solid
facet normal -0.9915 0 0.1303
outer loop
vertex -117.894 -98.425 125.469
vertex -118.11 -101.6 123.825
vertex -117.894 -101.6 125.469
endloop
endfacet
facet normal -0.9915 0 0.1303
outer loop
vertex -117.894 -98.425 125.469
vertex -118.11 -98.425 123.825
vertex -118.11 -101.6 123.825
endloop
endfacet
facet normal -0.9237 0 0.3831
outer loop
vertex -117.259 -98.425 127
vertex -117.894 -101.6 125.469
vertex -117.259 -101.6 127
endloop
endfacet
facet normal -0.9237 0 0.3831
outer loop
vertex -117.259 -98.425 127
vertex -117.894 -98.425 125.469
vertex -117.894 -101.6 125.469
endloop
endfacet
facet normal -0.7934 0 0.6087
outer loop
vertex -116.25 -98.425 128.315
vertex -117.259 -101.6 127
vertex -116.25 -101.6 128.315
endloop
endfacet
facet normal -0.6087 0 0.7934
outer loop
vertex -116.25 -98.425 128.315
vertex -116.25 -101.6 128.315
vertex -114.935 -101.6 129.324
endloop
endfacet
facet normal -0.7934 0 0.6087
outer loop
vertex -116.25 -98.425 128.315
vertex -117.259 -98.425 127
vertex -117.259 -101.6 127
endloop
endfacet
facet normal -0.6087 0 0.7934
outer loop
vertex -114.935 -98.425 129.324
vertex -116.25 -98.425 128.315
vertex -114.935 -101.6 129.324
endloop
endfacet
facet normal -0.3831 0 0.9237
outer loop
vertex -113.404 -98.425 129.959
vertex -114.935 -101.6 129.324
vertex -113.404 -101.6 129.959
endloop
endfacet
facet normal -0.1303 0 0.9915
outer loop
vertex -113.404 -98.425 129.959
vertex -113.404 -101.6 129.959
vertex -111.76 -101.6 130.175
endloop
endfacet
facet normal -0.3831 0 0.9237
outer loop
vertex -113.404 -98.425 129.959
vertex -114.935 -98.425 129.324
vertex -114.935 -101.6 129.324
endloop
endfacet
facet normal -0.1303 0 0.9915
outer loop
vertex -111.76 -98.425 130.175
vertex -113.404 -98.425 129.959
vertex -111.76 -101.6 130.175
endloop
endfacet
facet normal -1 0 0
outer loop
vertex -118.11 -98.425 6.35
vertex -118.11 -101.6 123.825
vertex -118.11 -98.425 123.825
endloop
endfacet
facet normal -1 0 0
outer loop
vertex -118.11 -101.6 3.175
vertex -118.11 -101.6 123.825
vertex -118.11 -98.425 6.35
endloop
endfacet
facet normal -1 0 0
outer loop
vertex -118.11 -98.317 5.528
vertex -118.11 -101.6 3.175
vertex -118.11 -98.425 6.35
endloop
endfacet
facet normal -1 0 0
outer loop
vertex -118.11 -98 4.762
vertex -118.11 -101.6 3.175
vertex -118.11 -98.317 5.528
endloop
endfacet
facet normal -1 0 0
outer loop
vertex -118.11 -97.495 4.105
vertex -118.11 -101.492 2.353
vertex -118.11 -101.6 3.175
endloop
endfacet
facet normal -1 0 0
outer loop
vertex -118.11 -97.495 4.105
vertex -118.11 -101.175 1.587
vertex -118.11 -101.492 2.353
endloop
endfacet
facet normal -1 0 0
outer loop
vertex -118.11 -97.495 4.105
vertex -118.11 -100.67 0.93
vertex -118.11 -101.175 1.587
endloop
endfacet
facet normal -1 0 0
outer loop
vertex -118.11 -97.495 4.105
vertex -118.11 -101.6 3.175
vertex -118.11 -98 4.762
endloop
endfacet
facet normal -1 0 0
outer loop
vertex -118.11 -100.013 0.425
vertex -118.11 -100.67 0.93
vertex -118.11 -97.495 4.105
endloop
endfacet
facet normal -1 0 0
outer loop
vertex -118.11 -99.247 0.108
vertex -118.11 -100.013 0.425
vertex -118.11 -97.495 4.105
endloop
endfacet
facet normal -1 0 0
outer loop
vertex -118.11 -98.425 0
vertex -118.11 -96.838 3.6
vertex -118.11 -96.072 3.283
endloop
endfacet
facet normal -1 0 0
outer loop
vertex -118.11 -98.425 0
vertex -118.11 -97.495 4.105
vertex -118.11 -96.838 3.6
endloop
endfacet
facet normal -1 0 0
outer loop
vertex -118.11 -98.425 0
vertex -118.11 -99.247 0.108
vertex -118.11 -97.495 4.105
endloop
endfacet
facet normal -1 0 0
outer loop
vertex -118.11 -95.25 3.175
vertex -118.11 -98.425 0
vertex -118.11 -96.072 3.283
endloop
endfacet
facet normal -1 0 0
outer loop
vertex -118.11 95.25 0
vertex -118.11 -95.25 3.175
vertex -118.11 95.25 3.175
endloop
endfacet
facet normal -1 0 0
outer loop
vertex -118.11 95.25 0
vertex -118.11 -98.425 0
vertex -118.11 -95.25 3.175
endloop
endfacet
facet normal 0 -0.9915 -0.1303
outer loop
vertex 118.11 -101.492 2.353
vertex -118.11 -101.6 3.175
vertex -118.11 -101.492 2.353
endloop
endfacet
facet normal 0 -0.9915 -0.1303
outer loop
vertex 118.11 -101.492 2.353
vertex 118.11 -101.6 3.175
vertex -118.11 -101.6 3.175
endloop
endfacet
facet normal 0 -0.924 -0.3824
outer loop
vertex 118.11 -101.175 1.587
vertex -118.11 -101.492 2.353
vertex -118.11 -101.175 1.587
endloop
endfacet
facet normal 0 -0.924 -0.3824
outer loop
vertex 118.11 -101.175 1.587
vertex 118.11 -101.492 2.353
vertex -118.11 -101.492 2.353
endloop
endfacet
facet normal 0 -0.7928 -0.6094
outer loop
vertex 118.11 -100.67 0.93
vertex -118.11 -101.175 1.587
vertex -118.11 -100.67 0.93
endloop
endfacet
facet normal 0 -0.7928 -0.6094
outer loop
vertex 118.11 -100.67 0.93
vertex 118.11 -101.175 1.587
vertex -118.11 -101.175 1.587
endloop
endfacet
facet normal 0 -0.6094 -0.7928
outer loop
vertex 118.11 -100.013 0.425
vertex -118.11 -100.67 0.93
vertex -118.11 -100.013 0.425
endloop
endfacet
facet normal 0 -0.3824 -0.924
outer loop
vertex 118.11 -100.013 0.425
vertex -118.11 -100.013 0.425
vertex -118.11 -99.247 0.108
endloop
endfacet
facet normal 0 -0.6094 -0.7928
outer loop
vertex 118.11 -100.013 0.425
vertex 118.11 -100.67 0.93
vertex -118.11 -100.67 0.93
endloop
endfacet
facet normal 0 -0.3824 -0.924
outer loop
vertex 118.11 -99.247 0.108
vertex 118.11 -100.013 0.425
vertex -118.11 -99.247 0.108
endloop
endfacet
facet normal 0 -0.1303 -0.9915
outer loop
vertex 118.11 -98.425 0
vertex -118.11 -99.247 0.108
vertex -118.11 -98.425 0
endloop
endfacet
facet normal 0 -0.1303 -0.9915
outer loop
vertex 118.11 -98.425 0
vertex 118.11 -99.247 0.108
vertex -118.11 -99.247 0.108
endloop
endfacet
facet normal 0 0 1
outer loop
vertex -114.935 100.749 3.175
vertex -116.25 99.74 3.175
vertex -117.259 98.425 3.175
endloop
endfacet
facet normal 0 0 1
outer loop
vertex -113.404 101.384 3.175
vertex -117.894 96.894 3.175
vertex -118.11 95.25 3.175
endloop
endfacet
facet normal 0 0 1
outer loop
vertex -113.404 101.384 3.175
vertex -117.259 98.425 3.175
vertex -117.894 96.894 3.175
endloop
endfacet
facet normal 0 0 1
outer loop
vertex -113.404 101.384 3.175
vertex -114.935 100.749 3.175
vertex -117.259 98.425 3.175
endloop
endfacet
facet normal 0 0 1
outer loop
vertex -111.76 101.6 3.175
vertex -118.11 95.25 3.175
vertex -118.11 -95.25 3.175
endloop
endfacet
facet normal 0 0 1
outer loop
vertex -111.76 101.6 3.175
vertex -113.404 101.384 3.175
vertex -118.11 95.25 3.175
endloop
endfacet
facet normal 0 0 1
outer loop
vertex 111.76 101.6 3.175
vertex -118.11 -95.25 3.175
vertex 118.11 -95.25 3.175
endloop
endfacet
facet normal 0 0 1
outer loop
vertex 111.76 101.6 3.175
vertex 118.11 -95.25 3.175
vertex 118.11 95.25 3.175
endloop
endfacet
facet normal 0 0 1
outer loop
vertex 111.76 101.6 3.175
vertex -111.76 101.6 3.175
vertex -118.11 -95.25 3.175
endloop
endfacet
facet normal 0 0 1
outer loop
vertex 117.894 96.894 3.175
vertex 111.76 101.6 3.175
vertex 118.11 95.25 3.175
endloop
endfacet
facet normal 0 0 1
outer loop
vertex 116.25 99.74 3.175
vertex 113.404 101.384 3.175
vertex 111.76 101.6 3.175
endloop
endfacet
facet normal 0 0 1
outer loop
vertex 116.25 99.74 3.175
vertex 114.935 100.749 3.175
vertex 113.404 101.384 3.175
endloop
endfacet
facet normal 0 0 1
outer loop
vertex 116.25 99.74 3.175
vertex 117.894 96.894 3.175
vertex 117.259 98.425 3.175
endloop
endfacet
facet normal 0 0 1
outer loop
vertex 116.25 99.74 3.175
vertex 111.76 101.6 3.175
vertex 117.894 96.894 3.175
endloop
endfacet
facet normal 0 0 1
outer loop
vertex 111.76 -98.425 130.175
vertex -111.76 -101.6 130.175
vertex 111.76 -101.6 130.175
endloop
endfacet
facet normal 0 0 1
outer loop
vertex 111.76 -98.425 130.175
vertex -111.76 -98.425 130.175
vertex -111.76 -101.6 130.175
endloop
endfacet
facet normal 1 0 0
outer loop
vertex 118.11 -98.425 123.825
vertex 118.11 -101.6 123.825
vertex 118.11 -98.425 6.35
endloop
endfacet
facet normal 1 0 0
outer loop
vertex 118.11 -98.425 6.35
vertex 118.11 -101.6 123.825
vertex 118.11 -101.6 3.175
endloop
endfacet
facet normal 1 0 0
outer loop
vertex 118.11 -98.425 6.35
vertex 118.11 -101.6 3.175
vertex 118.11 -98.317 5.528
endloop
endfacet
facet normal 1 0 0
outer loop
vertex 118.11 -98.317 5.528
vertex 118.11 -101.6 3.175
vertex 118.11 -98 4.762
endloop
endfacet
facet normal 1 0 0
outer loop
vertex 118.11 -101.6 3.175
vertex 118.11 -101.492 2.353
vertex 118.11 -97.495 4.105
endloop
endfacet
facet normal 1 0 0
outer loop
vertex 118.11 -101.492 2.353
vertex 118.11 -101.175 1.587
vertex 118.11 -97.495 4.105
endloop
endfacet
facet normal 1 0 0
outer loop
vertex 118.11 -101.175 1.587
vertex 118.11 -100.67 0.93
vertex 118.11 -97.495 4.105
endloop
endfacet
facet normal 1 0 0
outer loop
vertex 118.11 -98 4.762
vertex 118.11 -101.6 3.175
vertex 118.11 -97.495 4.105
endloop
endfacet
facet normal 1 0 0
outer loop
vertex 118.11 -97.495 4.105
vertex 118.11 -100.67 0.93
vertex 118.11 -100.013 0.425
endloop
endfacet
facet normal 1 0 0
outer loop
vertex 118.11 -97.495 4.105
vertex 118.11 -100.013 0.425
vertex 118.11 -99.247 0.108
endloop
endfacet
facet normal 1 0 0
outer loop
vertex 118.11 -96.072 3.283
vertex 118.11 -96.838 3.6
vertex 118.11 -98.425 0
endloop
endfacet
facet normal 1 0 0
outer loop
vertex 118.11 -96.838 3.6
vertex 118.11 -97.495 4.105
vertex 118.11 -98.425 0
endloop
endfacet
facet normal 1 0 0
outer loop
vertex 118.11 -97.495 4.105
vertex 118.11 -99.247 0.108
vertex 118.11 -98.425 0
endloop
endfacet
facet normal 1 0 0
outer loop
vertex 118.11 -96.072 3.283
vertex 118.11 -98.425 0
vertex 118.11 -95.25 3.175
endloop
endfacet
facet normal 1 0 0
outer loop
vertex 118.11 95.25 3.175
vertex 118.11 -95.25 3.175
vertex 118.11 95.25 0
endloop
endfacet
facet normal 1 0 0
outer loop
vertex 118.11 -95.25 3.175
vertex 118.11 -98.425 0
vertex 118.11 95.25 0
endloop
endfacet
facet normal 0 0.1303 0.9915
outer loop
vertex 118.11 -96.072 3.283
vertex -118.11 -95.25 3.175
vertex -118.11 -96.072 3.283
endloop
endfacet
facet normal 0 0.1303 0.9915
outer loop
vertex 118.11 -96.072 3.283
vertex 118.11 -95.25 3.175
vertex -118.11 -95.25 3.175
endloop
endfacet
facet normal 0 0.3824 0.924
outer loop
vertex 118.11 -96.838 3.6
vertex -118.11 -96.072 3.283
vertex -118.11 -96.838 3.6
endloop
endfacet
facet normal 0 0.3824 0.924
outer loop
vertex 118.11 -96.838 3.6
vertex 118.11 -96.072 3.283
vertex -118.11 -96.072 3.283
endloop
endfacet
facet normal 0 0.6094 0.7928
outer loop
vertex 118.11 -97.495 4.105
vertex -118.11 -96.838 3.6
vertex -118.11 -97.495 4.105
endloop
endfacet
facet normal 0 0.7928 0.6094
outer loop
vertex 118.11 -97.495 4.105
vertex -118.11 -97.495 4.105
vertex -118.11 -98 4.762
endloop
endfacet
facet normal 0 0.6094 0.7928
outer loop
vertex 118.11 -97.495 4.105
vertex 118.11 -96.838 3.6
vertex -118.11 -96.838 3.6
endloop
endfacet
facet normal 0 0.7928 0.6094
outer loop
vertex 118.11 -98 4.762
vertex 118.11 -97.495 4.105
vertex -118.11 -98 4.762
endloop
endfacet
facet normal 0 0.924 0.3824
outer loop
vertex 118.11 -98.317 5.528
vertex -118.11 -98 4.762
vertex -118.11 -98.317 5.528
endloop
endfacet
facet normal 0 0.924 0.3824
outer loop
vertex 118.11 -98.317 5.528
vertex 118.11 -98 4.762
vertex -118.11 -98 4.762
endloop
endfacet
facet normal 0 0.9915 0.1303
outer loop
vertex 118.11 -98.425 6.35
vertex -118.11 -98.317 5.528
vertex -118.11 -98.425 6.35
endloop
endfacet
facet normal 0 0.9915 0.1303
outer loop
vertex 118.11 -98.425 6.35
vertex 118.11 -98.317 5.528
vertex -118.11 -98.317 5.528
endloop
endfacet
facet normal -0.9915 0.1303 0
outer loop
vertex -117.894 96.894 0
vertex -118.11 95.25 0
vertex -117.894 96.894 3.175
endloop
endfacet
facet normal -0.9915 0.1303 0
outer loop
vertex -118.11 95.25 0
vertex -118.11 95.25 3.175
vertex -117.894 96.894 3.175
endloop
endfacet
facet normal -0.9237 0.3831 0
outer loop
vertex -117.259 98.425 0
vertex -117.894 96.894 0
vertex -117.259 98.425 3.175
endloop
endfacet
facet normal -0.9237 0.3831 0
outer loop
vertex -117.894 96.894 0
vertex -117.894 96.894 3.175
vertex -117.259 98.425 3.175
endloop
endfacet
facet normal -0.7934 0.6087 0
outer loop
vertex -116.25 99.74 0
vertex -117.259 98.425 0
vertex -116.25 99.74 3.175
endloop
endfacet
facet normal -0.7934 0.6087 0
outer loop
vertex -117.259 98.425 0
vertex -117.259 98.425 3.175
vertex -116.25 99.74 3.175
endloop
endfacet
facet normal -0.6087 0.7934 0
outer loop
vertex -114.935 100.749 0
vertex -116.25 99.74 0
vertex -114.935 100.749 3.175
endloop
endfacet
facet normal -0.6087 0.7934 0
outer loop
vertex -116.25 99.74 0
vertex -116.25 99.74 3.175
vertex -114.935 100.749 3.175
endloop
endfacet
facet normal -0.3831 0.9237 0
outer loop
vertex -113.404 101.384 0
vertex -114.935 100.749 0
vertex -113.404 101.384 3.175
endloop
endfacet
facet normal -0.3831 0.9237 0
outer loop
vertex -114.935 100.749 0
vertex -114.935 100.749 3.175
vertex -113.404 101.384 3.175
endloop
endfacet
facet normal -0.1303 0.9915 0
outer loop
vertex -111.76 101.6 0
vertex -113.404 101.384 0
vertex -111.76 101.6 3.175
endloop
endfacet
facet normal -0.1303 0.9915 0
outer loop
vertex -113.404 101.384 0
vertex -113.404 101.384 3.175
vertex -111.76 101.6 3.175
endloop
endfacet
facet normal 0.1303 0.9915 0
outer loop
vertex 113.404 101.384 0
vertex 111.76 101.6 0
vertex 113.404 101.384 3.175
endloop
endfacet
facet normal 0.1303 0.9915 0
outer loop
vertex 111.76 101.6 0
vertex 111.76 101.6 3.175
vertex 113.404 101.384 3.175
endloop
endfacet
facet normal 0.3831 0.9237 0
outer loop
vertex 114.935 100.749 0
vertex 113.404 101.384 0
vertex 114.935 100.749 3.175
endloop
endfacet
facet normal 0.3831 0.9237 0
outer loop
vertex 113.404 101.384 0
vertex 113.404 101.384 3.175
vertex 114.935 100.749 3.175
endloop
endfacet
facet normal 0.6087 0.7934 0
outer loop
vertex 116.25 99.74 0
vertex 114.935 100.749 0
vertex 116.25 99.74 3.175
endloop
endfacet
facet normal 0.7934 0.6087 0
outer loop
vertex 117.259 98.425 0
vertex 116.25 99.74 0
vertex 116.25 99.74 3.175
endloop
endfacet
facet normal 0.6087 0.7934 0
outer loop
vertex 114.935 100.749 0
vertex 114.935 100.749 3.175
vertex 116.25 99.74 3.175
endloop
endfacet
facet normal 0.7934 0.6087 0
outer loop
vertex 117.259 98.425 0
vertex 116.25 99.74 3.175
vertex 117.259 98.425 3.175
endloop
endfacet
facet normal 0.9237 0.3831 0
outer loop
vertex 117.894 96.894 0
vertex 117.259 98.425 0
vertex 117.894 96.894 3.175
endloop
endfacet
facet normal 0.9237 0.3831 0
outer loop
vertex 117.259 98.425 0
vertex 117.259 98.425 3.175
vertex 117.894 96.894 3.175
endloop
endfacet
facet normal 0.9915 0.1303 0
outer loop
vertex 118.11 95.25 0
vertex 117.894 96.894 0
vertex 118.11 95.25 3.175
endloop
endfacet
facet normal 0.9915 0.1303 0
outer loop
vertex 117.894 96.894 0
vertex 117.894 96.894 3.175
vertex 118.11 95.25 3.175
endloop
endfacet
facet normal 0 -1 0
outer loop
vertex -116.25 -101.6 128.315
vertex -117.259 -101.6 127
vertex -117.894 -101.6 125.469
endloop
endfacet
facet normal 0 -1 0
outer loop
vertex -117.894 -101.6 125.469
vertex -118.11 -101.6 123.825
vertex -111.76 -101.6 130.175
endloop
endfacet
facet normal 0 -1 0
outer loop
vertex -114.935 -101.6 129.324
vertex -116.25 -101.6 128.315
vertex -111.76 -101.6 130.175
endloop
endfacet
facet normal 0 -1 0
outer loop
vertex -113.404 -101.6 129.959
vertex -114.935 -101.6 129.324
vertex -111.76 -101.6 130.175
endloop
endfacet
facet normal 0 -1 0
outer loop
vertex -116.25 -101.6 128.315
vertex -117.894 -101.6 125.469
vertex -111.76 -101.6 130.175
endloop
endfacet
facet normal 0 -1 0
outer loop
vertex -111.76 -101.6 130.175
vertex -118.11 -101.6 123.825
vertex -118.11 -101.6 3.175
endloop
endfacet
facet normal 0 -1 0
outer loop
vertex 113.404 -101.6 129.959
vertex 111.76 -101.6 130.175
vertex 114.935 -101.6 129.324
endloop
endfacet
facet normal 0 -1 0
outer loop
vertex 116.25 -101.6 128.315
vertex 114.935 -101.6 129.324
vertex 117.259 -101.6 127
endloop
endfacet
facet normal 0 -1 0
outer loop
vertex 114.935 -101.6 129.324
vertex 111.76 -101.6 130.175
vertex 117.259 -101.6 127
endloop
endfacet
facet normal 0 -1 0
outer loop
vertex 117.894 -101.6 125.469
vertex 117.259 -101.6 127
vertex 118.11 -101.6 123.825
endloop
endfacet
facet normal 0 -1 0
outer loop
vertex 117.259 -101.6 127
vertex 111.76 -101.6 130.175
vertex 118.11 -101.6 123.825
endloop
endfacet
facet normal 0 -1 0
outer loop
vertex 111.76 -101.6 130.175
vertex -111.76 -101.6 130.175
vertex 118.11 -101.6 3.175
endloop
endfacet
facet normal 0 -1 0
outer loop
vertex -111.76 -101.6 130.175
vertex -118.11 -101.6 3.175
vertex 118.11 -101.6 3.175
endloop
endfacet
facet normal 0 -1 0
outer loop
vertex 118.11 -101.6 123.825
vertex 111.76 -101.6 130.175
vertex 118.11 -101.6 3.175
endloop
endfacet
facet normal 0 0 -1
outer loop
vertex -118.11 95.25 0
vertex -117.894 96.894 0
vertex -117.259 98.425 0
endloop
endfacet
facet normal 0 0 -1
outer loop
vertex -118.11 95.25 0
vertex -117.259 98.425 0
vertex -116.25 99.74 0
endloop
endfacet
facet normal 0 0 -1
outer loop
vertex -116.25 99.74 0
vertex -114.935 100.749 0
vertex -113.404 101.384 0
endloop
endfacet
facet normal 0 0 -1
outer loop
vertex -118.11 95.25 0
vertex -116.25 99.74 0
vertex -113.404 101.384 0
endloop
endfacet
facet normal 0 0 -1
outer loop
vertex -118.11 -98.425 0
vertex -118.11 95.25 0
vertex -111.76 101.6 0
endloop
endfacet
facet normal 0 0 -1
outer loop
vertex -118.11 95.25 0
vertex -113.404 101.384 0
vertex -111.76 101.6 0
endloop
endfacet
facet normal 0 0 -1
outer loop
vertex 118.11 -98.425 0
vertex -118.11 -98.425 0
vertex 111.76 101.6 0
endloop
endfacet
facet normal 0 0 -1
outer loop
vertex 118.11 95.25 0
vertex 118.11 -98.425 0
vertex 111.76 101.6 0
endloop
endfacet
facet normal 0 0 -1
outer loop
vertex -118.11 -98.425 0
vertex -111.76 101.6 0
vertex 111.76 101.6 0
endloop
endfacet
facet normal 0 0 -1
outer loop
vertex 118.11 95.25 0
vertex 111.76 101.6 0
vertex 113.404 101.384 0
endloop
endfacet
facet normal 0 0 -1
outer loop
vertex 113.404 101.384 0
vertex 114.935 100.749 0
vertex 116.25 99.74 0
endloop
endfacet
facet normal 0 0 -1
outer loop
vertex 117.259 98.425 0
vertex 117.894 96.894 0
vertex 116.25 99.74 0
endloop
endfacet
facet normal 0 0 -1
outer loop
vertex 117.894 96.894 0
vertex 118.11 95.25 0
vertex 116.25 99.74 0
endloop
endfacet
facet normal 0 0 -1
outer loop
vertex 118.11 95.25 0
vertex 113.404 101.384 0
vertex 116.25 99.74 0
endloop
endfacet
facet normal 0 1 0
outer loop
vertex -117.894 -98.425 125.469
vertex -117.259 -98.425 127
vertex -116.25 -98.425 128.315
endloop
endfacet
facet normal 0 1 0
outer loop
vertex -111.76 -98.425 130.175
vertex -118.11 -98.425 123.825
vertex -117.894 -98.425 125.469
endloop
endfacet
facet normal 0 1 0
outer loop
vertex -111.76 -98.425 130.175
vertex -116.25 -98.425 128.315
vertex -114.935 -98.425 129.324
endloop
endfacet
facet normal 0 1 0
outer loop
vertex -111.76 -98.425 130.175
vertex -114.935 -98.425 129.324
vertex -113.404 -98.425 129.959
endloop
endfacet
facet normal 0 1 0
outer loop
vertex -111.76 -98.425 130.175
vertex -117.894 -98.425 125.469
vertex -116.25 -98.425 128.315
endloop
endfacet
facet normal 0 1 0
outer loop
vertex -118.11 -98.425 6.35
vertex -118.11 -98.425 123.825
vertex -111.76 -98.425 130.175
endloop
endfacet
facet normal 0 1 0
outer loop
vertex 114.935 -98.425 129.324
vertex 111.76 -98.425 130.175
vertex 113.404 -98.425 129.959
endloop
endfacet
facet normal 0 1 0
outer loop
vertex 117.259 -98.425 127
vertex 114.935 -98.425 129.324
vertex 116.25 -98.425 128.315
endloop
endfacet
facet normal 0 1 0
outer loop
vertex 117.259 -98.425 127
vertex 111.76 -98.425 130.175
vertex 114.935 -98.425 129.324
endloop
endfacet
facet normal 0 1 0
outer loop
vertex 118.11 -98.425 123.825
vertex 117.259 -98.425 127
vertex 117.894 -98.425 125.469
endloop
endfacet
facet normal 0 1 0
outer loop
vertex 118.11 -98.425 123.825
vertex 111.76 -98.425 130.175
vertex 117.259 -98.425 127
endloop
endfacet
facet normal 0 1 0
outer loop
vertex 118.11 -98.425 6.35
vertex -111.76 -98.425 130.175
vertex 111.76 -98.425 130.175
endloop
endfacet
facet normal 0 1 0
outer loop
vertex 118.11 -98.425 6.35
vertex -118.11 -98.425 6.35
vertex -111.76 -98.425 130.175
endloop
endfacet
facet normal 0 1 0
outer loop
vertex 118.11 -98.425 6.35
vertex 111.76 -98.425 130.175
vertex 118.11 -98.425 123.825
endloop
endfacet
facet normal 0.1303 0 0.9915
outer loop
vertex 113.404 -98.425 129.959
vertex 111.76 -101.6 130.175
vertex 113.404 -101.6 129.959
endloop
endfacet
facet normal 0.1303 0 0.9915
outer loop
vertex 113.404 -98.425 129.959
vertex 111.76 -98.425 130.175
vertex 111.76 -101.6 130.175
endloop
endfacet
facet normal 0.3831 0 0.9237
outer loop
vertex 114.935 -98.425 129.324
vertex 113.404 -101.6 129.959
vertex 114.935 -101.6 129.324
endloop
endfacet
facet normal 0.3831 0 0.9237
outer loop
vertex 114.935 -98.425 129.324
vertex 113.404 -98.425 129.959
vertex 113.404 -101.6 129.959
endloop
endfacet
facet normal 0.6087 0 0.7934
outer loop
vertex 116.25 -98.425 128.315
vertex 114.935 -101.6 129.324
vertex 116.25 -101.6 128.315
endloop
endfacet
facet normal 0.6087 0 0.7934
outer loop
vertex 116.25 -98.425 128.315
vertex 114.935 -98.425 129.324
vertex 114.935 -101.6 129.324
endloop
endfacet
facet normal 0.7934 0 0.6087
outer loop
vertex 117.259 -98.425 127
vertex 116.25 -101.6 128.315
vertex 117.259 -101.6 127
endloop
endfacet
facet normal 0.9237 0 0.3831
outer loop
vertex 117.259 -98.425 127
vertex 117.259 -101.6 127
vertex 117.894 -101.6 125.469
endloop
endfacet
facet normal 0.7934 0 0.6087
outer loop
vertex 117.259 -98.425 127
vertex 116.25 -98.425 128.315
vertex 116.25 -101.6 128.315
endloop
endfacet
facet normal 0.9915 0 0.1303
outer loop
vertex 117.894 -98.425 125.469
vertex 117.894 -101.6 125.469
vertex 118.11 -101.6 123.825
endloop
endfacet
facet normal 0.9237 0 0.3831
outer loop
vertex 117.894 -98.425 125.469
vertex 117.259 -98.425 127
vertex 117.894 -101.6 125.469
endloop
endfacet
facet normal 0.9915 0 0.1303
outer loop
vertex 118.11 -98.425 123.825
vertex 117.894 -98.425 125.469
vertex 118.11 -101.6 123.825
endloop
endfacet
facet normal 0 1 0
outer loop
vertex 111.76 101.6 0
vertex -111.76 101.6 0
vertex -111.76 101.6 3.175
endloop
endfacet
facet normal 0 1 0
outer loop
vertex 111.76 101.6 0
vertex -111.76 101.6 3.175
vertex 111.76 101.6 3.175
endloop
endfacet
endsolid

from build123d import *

# Parameters (mm, degrees)
SKETCH2_W           = 236.22
SKETCH2_H           = 203.2
BOSS_EXTRUDE1_DEPTH = 3.175
SKETCH3_W           = 236.22
SKETCH3_H           = 3.175
BOSS_EXTRUDE2_DEPTH = 127
FILLET1_R           = 3.175
FILLET2_R           = 6.35


with BuildPart() as part:
    # Sketch2 → Boss-Extrude1 (new body)
    with BuildSketch(Plane.XY):
        Rectangle(SKETCH2_W, SKETCH2_H)
    extrude(amount=BOSS_EXTRUDE1_DEPTH)

    # Sketch3 → Boss-Extrude2 (add)
    with BuildSketch(Plane.XY.offset(3.175)):
        with Locations((0, -100.0125)):
            Rectangle(SKETCH3_W, SKETCH3_H)
    extrude(amount=BOSS_EXTRUDE2_DEPTH)

    # Fillet1
    fillet1_edges = [part.edges().sort_by_distance(p)[0] for p in [
        (0, -98.425, 3.175),
        (0, -101.6, 0),
    ]]
    fillet(fillet1_edges, radius=FILLET1_R)

    # Fillet2
    fillet2_edges = [part.edges().sort_by_distance(p)[0] for p in [
        (-118.11, -100.0125, 130.175),
        (118.11, -100.0125, 130.175),
        (-118.11, 101.6, 1.5875),
        (118.11, 101.6, 1.5875),
    ]]
    fillet(fillet2_edges, radius=FILLET2_R)


solid = part.part
